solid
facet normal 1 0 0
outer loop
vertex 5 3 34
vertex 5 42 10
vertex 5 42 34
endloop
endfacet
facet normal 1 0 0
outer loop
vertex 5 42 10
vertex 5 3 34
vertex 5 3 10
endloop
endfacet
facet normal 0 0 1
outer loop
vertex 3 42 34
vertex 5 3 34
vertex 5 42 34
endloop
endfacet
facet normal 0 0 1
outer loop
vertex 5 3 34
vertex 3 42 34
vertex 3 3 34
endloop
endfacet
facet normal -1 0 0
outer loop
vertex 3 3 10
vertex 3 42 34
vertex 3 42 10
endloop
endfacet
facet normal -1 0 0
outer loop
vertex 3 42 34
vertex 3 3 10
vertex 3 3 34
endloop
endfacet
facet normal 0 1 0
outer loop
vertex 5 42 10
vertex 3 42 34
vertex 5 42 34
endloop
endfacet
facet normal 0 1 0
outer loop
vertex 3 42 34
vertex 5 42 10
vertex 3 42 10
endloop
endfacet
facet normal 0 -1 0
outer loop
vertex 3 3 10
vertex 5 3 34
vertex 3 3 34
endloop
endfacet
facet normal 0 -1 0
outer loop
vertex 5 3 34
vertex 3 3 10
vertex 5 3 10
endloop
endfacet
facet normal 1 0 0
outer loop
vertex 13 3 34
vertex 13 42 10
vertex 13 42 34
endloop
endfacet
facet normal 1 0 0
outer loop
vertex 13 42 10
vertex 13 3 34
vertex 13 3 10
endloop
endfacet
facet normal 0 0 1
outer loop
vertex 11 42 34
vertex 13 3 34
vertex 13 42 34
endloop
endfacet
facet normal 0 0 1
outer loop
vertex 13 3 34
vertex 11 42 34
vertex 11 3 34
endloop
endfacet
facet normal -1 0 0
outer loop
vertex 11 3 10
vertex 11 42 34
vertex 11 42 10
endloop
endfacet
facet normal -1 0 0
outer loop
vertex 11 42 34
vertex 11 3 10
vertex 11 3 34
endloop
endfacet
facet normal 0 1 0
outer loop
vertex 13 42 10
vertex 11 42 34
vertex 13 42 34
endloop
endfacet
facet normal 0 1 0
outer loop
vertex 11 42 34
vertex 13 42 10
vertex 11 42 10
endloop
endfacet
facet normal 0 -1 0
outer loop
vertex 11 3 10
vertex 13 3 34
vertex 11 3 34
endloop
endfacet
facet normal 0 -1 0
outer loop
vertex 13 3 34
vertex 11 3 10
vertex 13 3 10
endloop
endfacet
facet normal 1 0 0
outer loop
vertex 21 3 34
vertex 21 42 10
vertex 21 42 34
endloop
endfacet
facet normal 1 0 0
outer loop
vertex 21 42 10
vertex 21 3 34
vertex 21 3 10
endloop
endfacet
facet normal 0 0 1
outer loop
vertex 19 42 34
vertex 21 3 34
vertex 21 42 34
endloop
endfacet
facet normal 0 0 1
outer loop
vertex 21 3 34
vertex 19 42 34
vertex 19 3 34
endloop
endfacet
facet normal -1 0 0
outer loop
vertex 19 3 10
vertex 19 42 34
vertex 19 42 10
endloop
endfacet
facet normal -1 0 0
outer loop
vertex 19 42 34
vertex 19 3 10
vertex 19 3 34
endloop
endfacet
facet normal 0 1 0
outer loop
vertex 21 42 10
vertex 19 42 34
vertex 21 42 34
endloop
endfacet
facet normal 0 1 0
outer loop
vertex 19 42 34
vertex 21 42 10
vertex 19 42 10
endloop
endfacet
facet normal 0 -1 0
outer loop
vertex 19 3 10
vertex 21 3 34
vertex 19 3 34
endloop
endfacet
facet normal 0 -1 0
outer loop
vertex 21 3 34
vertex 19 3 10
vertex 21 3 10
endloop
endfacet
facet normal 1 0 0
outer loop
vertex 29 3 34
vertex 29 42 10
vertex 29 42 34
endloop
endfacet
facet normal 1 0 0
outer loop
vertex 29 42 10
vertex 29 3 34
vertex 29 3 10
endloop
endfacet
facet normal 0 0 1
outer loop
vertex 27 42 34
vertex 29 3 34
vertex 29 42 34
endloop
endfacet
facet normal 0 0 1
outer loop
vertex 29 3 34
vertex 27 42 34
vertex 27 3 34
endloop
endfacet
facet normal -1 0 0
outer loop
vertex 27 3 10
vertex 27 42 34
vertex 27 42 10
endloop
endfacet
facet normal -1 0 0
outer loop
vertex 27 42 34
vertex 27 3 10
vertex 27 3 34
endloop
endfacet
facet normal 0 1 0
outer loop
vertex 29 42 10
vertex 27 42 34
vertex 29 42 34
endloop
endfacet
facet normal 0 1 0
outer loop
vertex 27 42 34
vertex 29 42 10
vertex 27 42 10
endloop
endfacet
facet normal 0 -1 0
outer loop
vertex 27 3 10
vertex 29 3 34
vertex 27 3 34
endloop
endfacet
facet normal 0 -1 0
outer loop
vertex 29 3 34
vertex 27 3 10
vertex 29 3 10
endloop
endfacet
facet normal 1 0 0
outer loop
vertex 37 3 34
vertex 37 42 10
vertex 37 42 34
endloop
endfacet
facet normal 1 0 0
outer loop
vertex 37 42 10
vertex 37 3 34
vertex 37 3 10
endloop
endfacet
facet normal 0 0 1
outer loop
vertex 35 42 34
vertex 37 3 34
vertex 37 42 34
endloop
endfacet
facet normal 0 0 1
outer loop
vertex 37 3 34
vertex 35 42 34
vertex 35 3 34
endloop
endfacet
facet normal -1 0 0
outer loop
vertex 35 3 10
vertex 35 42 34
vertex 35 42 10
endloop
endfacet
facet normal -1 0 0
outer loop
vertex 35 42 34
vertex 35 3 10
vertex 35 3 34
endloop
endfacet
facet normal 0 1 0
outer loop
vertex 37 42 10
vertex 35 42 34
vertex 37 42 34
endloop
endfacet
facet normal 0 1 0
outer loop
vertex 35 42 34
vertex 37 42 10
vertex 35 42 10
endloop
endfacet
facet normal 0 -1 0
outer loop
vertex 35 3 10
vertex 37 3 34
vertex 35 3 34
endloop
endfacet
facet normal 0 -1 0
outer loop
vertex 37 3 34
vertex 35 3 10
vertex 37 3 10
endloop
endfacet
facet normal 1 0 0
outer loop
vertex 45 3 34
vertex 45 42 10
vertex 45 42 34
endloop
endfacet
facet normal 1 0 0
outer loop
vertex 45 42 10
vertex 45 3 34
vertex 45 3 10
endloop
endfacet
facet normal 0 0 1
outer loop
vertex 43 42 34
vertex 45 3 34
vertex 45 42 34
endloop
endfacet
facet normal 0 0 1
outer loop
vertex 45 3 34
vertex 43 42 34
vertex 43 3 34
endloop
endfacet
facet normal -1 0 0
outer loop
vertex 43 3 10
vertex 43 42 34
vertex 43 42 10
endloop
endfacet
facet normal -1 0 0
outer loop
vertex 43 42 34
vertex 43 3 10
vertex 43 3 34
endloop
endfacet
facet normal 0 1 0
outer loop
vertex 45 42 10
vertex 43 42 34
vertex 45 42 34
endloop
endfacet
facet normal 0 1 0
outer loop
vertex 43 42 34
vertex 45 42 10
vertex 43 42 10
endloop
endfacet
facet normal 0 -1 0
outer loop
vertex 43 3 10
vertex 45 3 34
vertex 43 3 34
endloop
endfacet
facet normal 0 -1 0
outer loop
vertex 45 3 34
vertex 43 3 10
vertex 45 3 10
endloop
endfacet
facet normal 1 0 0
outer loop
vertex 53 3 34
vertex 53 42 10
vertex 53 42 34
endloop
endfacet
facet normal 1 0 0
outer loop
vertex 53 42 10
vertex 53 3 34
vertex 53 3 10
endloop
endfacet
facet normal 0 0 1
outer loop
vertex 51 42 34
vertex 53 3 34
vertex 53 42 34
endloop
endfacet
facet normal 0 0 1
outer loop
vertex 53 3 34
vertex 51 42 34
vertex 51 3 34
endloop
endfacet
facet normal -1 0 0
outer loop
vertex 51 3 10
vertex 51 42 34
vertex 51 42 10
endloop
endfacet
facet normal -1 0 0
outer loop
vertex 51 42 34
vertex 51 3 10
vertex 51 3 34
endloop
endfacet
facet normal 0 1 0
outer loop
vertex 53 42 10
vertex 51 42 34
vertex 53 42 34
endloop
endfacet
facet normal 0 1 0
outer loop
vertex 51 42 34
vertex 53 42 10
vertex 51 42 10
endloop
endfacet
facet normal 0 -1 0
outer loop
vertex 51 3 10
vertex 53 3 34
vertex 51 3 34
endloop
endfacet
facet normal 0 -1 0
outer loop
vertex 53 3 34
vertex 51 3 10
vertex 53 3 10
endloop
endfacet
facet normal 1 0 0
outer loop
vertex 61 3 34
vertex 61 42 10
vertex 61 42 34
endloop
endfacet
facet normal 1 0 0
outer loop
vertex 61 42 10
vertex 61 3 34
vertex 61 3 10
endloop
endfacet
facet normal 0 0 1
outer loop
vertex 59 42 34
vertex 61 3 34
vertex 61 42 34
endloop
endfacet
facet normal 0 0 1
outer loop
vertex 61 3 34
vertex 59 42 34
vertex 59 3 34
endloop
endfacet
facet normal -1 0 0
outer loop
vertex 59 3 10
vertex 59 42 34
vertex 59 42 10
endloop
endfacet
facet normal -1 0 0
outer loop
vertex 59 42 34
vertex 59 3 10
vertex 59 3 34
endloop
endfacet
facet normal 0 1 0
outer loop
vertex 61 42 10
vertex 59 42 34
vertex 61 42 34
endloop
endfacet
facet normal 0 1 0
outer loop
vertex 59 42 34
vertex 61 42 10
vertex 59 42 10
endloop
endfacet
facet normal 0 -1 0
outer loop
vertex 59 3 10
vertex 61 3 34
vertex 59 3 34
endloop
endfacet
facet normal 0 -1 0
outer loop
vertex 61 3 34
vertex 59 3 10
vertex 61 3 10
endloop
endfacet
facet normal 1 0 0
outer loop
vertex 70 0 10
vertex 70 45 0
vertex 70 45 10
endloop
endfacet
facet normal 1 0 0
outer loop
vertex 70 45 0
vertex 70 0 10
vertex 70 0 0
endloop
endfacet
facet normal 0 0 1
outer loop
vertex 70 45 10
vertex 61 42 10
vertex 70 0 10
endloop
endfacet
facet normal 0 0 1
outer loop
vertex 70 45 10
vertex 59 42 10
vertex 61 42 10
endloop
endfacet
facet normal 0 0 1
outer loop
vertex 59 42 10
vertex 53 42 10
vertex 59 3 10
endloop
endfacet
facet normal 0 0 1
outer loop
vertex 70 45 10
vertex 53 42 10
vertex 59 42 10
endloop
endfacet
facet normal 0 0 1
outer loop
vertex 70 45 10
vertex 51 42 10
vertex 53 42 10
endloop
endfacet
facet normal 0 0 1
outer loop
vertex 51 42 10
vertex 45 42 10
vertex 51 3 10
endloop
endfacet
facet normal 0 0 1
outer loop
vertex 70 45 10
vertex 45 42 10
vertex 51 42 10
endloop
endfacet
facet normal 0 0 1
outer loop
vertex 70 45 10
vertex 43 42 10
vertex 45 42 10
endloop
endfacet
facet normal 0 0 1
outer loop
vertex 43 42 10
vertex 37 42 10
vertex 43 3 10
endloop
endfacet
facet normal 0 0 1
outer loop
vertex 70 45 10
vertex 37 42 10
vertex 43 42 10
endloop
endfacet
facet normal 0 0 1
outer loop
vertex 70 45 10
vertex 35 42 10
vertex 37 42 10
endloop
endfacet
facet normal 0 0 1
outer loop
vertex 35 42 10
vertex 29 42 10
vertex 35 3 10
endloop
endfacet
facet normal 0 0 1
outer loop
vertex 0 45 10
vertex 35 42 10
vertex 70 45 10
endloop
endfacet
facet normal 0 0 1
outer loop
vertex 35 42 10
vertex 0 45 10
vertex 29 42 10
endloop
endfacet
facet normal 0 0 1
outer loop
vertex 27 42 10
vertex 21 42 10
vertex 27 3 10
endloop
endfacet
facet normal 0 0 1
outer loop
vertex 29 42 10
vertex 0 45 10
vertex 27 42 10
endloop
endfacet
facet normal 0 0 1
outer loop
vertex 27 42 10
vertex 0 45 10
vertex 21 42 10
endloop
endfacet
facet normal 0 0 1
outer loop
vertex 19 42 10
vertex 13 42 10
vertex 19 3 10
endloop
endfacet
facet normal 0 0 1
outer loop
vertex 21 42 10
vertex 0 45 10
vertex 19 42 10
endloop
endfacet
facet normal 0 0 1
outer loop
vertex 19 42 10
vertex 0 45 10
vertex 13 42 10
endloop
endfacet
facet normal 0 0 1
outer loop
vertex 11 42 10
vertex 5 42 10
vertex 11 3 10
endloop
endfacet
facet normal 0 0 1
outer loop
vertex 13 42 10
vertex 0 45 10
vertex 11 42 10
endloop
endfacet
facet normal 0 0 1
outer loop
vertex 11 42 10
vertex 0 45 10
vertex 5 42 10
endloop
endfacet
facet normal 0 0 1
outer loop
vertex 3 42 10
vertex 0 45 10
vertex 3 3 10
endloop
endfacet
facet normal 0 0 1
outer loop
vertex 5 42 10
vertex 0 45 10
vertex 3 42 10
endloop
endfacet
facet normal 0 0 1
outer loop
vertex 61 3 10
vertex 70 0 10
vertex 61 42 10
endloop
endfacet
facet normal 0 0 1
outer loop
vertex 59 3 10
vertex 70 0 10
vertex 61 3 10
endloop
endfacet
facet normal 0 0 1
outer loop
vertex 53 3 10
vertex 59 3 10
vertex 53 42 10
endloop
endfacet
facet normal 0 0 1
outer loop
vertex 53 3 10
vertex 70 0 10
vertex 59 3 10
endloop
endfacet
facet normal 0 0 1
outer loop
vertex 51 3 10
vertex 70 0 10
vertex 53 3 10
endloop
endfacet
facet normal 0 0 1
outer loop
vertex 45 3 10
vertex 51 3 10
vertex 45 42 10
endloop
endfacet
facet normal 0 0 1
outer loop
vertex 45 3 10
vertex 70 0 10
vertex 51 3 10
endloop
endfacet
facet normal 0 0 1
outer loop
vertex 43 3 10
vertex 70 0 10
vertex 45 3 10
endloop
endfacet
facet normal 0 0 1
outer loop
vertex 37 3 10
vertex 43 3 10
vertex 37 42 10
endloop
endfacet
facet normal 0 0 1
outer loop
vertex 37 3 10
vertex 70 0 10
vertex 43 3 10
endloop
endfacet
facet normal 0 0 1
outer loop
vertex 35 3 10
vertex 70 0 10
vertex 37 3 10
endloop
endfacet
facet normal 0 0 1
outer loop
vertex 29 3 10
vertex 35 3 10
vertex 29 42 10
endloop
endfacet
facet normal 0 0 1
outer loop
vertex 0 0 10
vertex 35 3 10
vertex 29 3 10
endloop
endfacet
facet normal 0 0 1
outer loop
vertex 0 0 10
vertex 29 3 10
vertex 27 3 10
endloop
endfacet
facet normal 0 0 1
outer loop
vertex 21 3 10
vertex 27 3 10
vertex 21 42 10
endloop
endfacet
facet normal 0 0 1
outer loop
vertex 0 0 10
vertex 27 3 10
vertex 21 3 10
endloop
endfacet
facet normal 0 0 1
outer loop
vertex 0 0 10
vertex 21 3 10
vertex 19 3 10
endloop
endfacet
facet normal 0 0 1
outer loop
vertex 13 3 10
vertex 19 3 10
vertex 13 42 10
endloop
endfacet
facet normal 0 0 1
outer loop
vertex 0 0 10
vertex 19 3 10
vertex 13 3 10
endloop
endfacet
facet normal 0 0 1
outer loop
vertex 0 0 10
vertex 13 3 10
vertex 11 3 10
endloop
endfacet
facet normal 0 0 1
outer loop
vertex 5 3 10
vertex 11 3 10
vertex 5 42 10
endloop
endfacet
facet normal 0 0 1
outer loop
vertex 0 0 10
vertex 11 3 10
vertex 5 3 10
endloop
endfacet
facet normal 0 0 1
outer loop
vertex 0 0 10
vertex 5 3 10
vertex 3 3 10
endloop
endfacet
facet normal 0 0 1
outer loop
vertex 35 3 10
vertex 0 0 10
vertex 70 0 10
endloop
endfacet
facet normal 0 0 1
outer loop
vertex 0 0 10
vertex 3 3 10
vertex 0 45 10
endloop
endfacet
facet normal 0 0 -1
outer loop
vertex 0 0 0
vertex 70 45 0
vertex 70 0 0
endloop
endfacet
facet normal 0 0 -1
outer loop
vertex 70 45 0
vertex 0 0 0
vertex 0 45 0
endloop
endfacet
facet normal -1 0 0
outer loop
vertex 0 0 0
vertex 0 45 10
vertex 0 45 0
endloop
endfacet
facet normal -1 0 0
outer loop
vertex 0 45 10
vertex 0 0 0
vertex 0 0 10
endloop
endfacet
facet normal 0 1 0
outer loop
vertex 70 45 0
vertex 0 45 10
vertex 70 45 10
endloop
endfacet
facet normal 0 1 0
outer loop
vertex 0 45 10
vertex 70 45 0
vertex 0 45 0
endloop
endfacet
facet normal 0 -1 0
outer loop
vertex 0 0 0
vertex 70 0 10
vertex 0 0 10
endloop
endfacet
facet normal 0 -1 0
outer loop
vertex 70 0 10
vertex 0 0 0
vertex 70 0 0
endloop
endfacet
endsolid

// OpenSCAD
$fn = 32;

// ----------------------------------------------------------------------
// Heatsink: uniform fin block
// ----------------------------------------------------------------------

// --- parameters (mm) ---
base_l = 70;              // base length, X
base_w = 45;              // base width, Y
base_t = 10;              // base plate thickness
fin_h = 25;               // fin height above the base
fin_t = 2;                // fin thickness
edge = 3;                 // margin from the base ends
pitch = 8;                // fin pitch

n_fins = floor((base_l - 2 * edge - fin_t) / pitch) + 1;  // fin count
total_h = base_t + fin_h - 1;  // overall height

union() {
  cube([base_l, base_w, base_t]);
  for (i = [0 : n_fins - 1])
    translate([edge + i * pitch, edge, base_t - 1])
      cube([fin_t, base_w - 2 * edge, fin_h]);
}
